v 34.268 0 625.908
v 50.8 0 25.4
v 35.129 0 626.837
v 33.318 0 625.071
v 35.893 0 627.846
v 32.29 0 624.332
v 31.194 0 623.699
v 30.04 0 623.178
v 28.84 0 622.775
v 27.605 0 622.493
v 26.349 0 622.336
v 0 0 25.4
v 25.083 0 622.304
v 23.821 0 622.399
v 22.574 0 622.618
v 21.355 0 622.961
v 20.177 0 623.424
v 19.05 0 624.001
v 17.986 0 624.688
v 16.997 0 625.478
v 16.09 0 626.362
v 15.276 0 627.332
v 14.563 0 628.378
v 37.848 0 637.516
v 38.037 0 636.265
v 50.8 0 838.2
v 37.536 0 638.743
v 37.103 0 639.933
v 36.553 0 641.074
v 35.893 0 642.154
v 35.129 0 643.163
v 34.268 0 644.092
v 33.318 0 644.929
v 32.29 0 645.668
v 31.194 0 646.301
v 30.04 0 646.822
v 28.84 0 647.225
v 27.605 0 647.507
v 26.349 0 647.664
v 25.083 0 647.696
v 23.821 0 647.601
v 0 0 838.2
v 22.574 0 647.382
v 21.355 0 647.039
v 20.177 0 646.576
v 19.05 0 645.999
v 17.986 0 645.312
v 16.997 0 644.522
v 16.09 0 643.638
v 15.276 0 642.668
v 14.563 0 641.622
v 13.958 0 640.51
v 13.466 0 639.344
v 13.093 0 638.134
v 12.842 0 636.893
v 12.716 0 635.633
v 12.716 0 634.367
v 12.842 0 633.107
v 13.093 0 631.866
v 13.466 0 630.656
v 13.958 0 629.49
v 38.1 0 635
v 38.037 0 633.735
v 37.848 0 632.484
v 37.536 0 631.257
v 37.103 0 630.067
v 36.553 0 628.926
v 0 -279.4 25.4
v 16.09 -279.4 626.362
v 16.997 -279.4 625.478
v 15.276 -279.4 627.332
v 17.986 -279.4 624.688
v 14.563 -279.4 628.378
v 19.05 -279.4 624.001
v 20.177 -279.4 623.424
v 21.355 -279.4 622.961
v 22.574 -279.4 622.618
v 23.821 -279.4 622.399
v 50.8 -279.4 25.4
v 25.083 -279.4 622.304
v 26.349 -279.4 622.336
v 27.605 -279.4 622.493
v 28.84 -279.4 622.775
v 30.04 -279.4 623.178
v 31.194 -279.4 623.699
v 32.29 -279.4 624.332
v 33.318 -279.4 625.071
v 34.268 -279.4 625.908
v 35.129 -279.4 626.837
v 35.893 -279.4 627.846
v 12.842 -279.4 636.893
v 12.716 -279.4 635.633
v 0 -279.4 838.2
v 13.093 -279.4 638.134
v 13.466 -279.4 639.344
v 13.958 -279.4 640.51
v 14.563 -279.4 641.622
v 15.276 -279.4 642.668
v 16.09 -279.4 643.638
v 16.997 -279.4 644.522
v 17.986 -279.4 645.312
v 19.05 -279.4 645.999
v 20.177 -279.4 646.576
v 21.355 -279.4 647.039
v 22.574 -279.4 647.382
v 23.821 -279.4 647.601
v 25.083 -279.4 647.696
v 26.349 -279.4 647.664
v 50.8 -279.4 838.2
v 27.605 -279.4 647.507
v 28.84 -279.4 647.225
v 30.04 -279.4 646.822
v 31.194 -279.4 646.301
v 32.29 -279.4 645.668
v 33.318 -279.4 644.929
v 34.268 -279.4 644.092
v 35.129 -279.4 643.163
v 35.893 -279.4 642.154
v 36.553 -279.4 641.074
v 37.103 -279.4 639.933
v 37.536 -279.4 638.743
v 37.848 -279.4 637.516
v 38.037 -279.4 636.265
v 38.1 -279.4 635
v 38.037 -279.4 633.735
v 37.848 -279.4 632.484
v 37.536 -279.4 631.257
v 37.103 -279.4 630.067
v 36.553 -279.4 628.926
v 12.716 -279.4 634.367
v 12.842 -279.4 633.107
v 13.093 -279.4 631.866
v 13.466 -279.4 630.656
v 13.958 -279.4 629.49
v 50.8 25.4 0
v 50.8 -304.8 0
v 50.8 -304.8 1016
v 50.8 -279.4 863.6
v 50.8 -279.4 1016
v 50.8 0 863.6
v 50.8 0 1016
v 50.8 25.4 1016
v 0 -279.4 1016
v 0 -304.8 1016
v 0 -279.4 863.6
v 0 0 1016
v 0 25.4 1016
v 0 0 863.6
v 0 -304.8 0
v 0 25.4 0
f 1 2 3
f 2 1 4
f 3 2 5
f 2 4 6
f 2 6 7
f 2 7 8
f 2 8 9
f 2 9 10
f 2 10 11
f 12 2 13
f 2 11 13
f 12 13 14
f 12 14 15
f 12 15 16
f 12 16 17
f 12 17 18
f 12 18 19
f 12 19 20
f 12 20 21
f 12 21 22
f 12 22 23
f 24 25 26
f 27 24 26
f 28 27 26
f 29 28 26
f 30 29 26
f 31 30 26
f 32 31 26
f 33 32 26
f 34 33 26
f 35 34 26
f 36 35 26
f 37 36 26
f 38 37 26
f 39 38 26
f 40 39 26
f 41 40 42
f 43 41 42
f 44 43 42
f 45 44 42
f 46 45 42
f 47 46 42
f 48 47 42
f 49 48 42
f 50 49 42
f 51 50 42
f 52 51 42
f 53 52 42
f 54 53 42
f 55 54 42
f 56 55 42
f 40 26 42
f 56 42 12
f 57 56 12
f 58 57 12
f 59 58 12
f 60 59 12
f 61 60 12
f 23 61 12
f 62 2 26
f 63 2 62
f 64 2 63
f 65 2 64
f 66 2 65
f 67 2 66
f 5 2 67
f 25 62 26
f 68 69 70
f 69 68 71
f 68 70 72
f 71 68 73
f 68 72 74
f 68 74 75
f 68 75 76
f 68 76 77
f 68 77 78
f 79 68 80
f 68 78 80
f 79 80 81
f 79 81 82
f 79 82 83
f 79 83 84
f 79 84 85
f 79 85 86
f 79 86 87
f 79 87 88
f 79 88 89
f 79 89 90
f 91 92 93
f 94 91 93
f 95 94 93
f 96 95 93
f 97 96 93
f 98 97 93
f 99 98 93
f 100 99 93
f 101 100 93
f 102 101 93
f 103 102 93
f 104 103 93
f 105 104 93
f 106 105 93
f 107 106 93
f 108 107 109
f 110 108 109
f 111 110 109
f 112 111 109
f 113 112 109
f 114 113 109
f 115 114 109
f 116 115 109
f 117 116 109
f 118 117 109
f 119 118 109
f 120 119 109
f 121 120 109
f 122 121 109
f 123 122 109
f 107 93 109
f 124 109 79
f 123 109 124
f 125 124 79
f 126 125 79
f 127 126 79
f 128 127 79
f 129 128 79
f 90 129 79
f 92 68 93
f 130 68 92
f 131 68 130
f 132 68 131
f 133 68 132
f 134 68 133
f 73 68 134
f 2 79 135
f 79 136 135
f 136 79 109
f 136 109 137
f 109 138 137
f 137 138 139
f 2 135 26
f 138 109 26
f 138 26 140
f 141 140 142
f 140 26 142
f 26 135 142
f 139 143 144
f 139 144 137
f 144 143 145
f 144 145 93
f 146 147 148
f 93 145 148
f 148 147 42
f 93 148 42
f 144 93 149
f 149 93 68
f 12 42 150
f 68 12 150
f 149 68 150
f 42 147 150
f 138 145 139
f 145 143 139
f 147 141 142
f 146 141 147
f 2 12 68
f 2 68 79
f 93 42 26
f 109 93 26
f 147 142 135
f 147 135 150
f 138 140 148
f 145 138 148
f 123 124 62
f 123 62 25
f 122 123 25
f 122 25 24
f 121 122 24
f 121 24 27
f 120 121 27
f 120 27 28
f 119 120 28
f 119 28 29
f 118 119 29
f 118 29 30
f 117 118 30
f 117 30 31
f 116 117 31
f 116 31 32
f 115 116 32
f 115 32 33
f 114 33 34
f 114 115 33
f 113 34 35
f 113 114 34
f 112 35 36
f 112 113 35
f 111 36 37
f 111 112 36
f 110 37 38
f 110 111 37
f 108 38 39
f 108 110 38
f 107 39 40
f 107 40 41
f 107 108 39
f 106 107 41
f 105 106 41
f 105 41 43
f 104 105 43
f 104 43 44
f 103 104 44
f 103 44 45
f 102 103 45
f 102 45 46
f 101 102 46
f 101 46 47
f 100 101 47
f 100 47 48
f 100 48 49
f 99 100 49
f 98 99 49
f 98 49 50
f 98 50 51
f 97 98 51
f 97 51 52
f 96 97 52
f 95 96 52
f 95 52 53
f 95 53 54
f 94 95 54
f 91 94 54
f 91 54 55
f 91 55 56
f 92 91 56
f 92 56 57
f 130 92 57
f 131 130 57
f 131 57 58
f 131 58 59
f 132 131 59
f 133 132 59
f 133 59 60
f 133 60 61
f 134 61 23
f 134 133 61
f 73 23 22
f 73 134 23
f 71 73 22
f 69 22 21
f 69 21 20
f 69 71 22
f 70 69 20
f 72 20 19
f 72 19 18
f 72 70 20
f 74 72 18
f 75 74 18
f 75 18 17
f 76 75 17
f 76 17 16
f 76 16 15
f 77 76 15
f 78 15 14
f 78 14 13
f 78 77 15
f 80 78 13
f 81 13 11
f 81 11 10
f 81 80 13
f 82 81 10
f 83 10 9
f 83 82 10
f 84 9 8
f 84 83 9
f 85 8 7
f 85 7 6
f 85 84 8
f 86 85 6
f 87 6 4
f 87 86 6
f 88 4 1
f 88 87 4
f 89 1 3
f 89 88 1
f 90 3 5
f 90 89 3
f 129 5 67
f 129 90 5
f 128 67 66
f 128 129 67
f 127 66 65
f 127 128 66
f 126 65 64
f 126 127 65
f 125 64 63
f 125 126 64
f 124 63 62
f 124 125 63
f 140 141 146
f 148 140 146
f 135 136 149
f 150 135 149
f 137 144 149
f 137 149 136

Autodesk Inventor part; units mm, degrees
ref_plane "YZ Plane" through (0, 0, 0) normal (1, 0, 0) x (0, 1, 0)
ref_plane "XZ Plane" through (0, 0, 0) normal (0, 1, 0) x (-1, 0, 0)
ref_plane "XY Plane" through (0, 0, 0) normal (0, 0, 1) x (1, 0, 0)
sketch "Sketch1" plane through (0, 0, 0) normal (0, 1, 0) x (-1, 0, 0)
  line L0 (0, 0) -> (-50.8, 0)
  line L1 (-50.8, 0) -> (-50.8, 1016)
  line L2 (-50.8, 1016) -> (0, 1016)
  line L3 (0, 1016) -> (0, 0)
  dimension "d0" = 1016
  dimension "d1" = 50.8
extrude "Extrusion1" add sketch "Sketch1" along normal blind 25.4
sketch "Sketch2" plane through (0, 0, 0) normal (0, -1, 0) x (1, 0, 0)
  line L0 (0, 838.2) -> (50.8, 838.2)
  line L1 (50.8, 838.2) -> (50.8, 863.6)
  line L2 (50.8, 863.6) -> (0, 863.6)
  line L3 (0, 863.6) -> (0, 838.2)
  line L4 (50.8, 1016) -> (0, 1016) projected
  line L5 (50.8, 0) -> (0, 0) projected
  line L6 (50.8, 0) -> (0, 0)
  line L7 (0, 0) -> (0, 25.4)
  line L8 (0, 25.4) -> (50.8, 25.4)
  line L9 (50.8, 25.4) -> (50.8, 0)
  dimension "d4" = 25.4
  dimension "d7" = 152.4
  dimension "d30" = 25.4
extrude "Extrusion2" add sketch "Sketch2" along normal blind 279.4
sketch "Sketch3" plane through (0, -279.4, 0) normal (0, -1, 0) x (1, 0, 0)
  line L0 (50.8, 0) -> (0, 0) projected
  line L1 (0, 1016) -> (50.8, 1016) projected
  line L2 (0, 0) -> (50.8, 0)
  line L3 (50.8, 0) -> (50.8, 1016)
  line L4 (50.8, 1016) -> (0, 1016)
  line L5 (0, 1016) -> (0, 0)
extrude "Extrusion3" add sketch "Sketch3" along normal blind 25.4
sketch "Sketch4" plane through (0, -279.4, 0) normal (0, 1, 0) x (1, 0, 0)
  circle A0 centre (25.4, -635) radius 12.7
  line L0 (0, -1016) -> (50.8, -1016) projected
  line L1 (0, -1016) -> (0, -863.6) projected
  point P0 (0, 0)
  dimension "d12" = 25.4
  dimension "d13" = 381
  dimension "d18" = 25.4
extrude "Extrusion4" add sketch "Sketch4" along normal blind 284.1625
properties part number "stage"
